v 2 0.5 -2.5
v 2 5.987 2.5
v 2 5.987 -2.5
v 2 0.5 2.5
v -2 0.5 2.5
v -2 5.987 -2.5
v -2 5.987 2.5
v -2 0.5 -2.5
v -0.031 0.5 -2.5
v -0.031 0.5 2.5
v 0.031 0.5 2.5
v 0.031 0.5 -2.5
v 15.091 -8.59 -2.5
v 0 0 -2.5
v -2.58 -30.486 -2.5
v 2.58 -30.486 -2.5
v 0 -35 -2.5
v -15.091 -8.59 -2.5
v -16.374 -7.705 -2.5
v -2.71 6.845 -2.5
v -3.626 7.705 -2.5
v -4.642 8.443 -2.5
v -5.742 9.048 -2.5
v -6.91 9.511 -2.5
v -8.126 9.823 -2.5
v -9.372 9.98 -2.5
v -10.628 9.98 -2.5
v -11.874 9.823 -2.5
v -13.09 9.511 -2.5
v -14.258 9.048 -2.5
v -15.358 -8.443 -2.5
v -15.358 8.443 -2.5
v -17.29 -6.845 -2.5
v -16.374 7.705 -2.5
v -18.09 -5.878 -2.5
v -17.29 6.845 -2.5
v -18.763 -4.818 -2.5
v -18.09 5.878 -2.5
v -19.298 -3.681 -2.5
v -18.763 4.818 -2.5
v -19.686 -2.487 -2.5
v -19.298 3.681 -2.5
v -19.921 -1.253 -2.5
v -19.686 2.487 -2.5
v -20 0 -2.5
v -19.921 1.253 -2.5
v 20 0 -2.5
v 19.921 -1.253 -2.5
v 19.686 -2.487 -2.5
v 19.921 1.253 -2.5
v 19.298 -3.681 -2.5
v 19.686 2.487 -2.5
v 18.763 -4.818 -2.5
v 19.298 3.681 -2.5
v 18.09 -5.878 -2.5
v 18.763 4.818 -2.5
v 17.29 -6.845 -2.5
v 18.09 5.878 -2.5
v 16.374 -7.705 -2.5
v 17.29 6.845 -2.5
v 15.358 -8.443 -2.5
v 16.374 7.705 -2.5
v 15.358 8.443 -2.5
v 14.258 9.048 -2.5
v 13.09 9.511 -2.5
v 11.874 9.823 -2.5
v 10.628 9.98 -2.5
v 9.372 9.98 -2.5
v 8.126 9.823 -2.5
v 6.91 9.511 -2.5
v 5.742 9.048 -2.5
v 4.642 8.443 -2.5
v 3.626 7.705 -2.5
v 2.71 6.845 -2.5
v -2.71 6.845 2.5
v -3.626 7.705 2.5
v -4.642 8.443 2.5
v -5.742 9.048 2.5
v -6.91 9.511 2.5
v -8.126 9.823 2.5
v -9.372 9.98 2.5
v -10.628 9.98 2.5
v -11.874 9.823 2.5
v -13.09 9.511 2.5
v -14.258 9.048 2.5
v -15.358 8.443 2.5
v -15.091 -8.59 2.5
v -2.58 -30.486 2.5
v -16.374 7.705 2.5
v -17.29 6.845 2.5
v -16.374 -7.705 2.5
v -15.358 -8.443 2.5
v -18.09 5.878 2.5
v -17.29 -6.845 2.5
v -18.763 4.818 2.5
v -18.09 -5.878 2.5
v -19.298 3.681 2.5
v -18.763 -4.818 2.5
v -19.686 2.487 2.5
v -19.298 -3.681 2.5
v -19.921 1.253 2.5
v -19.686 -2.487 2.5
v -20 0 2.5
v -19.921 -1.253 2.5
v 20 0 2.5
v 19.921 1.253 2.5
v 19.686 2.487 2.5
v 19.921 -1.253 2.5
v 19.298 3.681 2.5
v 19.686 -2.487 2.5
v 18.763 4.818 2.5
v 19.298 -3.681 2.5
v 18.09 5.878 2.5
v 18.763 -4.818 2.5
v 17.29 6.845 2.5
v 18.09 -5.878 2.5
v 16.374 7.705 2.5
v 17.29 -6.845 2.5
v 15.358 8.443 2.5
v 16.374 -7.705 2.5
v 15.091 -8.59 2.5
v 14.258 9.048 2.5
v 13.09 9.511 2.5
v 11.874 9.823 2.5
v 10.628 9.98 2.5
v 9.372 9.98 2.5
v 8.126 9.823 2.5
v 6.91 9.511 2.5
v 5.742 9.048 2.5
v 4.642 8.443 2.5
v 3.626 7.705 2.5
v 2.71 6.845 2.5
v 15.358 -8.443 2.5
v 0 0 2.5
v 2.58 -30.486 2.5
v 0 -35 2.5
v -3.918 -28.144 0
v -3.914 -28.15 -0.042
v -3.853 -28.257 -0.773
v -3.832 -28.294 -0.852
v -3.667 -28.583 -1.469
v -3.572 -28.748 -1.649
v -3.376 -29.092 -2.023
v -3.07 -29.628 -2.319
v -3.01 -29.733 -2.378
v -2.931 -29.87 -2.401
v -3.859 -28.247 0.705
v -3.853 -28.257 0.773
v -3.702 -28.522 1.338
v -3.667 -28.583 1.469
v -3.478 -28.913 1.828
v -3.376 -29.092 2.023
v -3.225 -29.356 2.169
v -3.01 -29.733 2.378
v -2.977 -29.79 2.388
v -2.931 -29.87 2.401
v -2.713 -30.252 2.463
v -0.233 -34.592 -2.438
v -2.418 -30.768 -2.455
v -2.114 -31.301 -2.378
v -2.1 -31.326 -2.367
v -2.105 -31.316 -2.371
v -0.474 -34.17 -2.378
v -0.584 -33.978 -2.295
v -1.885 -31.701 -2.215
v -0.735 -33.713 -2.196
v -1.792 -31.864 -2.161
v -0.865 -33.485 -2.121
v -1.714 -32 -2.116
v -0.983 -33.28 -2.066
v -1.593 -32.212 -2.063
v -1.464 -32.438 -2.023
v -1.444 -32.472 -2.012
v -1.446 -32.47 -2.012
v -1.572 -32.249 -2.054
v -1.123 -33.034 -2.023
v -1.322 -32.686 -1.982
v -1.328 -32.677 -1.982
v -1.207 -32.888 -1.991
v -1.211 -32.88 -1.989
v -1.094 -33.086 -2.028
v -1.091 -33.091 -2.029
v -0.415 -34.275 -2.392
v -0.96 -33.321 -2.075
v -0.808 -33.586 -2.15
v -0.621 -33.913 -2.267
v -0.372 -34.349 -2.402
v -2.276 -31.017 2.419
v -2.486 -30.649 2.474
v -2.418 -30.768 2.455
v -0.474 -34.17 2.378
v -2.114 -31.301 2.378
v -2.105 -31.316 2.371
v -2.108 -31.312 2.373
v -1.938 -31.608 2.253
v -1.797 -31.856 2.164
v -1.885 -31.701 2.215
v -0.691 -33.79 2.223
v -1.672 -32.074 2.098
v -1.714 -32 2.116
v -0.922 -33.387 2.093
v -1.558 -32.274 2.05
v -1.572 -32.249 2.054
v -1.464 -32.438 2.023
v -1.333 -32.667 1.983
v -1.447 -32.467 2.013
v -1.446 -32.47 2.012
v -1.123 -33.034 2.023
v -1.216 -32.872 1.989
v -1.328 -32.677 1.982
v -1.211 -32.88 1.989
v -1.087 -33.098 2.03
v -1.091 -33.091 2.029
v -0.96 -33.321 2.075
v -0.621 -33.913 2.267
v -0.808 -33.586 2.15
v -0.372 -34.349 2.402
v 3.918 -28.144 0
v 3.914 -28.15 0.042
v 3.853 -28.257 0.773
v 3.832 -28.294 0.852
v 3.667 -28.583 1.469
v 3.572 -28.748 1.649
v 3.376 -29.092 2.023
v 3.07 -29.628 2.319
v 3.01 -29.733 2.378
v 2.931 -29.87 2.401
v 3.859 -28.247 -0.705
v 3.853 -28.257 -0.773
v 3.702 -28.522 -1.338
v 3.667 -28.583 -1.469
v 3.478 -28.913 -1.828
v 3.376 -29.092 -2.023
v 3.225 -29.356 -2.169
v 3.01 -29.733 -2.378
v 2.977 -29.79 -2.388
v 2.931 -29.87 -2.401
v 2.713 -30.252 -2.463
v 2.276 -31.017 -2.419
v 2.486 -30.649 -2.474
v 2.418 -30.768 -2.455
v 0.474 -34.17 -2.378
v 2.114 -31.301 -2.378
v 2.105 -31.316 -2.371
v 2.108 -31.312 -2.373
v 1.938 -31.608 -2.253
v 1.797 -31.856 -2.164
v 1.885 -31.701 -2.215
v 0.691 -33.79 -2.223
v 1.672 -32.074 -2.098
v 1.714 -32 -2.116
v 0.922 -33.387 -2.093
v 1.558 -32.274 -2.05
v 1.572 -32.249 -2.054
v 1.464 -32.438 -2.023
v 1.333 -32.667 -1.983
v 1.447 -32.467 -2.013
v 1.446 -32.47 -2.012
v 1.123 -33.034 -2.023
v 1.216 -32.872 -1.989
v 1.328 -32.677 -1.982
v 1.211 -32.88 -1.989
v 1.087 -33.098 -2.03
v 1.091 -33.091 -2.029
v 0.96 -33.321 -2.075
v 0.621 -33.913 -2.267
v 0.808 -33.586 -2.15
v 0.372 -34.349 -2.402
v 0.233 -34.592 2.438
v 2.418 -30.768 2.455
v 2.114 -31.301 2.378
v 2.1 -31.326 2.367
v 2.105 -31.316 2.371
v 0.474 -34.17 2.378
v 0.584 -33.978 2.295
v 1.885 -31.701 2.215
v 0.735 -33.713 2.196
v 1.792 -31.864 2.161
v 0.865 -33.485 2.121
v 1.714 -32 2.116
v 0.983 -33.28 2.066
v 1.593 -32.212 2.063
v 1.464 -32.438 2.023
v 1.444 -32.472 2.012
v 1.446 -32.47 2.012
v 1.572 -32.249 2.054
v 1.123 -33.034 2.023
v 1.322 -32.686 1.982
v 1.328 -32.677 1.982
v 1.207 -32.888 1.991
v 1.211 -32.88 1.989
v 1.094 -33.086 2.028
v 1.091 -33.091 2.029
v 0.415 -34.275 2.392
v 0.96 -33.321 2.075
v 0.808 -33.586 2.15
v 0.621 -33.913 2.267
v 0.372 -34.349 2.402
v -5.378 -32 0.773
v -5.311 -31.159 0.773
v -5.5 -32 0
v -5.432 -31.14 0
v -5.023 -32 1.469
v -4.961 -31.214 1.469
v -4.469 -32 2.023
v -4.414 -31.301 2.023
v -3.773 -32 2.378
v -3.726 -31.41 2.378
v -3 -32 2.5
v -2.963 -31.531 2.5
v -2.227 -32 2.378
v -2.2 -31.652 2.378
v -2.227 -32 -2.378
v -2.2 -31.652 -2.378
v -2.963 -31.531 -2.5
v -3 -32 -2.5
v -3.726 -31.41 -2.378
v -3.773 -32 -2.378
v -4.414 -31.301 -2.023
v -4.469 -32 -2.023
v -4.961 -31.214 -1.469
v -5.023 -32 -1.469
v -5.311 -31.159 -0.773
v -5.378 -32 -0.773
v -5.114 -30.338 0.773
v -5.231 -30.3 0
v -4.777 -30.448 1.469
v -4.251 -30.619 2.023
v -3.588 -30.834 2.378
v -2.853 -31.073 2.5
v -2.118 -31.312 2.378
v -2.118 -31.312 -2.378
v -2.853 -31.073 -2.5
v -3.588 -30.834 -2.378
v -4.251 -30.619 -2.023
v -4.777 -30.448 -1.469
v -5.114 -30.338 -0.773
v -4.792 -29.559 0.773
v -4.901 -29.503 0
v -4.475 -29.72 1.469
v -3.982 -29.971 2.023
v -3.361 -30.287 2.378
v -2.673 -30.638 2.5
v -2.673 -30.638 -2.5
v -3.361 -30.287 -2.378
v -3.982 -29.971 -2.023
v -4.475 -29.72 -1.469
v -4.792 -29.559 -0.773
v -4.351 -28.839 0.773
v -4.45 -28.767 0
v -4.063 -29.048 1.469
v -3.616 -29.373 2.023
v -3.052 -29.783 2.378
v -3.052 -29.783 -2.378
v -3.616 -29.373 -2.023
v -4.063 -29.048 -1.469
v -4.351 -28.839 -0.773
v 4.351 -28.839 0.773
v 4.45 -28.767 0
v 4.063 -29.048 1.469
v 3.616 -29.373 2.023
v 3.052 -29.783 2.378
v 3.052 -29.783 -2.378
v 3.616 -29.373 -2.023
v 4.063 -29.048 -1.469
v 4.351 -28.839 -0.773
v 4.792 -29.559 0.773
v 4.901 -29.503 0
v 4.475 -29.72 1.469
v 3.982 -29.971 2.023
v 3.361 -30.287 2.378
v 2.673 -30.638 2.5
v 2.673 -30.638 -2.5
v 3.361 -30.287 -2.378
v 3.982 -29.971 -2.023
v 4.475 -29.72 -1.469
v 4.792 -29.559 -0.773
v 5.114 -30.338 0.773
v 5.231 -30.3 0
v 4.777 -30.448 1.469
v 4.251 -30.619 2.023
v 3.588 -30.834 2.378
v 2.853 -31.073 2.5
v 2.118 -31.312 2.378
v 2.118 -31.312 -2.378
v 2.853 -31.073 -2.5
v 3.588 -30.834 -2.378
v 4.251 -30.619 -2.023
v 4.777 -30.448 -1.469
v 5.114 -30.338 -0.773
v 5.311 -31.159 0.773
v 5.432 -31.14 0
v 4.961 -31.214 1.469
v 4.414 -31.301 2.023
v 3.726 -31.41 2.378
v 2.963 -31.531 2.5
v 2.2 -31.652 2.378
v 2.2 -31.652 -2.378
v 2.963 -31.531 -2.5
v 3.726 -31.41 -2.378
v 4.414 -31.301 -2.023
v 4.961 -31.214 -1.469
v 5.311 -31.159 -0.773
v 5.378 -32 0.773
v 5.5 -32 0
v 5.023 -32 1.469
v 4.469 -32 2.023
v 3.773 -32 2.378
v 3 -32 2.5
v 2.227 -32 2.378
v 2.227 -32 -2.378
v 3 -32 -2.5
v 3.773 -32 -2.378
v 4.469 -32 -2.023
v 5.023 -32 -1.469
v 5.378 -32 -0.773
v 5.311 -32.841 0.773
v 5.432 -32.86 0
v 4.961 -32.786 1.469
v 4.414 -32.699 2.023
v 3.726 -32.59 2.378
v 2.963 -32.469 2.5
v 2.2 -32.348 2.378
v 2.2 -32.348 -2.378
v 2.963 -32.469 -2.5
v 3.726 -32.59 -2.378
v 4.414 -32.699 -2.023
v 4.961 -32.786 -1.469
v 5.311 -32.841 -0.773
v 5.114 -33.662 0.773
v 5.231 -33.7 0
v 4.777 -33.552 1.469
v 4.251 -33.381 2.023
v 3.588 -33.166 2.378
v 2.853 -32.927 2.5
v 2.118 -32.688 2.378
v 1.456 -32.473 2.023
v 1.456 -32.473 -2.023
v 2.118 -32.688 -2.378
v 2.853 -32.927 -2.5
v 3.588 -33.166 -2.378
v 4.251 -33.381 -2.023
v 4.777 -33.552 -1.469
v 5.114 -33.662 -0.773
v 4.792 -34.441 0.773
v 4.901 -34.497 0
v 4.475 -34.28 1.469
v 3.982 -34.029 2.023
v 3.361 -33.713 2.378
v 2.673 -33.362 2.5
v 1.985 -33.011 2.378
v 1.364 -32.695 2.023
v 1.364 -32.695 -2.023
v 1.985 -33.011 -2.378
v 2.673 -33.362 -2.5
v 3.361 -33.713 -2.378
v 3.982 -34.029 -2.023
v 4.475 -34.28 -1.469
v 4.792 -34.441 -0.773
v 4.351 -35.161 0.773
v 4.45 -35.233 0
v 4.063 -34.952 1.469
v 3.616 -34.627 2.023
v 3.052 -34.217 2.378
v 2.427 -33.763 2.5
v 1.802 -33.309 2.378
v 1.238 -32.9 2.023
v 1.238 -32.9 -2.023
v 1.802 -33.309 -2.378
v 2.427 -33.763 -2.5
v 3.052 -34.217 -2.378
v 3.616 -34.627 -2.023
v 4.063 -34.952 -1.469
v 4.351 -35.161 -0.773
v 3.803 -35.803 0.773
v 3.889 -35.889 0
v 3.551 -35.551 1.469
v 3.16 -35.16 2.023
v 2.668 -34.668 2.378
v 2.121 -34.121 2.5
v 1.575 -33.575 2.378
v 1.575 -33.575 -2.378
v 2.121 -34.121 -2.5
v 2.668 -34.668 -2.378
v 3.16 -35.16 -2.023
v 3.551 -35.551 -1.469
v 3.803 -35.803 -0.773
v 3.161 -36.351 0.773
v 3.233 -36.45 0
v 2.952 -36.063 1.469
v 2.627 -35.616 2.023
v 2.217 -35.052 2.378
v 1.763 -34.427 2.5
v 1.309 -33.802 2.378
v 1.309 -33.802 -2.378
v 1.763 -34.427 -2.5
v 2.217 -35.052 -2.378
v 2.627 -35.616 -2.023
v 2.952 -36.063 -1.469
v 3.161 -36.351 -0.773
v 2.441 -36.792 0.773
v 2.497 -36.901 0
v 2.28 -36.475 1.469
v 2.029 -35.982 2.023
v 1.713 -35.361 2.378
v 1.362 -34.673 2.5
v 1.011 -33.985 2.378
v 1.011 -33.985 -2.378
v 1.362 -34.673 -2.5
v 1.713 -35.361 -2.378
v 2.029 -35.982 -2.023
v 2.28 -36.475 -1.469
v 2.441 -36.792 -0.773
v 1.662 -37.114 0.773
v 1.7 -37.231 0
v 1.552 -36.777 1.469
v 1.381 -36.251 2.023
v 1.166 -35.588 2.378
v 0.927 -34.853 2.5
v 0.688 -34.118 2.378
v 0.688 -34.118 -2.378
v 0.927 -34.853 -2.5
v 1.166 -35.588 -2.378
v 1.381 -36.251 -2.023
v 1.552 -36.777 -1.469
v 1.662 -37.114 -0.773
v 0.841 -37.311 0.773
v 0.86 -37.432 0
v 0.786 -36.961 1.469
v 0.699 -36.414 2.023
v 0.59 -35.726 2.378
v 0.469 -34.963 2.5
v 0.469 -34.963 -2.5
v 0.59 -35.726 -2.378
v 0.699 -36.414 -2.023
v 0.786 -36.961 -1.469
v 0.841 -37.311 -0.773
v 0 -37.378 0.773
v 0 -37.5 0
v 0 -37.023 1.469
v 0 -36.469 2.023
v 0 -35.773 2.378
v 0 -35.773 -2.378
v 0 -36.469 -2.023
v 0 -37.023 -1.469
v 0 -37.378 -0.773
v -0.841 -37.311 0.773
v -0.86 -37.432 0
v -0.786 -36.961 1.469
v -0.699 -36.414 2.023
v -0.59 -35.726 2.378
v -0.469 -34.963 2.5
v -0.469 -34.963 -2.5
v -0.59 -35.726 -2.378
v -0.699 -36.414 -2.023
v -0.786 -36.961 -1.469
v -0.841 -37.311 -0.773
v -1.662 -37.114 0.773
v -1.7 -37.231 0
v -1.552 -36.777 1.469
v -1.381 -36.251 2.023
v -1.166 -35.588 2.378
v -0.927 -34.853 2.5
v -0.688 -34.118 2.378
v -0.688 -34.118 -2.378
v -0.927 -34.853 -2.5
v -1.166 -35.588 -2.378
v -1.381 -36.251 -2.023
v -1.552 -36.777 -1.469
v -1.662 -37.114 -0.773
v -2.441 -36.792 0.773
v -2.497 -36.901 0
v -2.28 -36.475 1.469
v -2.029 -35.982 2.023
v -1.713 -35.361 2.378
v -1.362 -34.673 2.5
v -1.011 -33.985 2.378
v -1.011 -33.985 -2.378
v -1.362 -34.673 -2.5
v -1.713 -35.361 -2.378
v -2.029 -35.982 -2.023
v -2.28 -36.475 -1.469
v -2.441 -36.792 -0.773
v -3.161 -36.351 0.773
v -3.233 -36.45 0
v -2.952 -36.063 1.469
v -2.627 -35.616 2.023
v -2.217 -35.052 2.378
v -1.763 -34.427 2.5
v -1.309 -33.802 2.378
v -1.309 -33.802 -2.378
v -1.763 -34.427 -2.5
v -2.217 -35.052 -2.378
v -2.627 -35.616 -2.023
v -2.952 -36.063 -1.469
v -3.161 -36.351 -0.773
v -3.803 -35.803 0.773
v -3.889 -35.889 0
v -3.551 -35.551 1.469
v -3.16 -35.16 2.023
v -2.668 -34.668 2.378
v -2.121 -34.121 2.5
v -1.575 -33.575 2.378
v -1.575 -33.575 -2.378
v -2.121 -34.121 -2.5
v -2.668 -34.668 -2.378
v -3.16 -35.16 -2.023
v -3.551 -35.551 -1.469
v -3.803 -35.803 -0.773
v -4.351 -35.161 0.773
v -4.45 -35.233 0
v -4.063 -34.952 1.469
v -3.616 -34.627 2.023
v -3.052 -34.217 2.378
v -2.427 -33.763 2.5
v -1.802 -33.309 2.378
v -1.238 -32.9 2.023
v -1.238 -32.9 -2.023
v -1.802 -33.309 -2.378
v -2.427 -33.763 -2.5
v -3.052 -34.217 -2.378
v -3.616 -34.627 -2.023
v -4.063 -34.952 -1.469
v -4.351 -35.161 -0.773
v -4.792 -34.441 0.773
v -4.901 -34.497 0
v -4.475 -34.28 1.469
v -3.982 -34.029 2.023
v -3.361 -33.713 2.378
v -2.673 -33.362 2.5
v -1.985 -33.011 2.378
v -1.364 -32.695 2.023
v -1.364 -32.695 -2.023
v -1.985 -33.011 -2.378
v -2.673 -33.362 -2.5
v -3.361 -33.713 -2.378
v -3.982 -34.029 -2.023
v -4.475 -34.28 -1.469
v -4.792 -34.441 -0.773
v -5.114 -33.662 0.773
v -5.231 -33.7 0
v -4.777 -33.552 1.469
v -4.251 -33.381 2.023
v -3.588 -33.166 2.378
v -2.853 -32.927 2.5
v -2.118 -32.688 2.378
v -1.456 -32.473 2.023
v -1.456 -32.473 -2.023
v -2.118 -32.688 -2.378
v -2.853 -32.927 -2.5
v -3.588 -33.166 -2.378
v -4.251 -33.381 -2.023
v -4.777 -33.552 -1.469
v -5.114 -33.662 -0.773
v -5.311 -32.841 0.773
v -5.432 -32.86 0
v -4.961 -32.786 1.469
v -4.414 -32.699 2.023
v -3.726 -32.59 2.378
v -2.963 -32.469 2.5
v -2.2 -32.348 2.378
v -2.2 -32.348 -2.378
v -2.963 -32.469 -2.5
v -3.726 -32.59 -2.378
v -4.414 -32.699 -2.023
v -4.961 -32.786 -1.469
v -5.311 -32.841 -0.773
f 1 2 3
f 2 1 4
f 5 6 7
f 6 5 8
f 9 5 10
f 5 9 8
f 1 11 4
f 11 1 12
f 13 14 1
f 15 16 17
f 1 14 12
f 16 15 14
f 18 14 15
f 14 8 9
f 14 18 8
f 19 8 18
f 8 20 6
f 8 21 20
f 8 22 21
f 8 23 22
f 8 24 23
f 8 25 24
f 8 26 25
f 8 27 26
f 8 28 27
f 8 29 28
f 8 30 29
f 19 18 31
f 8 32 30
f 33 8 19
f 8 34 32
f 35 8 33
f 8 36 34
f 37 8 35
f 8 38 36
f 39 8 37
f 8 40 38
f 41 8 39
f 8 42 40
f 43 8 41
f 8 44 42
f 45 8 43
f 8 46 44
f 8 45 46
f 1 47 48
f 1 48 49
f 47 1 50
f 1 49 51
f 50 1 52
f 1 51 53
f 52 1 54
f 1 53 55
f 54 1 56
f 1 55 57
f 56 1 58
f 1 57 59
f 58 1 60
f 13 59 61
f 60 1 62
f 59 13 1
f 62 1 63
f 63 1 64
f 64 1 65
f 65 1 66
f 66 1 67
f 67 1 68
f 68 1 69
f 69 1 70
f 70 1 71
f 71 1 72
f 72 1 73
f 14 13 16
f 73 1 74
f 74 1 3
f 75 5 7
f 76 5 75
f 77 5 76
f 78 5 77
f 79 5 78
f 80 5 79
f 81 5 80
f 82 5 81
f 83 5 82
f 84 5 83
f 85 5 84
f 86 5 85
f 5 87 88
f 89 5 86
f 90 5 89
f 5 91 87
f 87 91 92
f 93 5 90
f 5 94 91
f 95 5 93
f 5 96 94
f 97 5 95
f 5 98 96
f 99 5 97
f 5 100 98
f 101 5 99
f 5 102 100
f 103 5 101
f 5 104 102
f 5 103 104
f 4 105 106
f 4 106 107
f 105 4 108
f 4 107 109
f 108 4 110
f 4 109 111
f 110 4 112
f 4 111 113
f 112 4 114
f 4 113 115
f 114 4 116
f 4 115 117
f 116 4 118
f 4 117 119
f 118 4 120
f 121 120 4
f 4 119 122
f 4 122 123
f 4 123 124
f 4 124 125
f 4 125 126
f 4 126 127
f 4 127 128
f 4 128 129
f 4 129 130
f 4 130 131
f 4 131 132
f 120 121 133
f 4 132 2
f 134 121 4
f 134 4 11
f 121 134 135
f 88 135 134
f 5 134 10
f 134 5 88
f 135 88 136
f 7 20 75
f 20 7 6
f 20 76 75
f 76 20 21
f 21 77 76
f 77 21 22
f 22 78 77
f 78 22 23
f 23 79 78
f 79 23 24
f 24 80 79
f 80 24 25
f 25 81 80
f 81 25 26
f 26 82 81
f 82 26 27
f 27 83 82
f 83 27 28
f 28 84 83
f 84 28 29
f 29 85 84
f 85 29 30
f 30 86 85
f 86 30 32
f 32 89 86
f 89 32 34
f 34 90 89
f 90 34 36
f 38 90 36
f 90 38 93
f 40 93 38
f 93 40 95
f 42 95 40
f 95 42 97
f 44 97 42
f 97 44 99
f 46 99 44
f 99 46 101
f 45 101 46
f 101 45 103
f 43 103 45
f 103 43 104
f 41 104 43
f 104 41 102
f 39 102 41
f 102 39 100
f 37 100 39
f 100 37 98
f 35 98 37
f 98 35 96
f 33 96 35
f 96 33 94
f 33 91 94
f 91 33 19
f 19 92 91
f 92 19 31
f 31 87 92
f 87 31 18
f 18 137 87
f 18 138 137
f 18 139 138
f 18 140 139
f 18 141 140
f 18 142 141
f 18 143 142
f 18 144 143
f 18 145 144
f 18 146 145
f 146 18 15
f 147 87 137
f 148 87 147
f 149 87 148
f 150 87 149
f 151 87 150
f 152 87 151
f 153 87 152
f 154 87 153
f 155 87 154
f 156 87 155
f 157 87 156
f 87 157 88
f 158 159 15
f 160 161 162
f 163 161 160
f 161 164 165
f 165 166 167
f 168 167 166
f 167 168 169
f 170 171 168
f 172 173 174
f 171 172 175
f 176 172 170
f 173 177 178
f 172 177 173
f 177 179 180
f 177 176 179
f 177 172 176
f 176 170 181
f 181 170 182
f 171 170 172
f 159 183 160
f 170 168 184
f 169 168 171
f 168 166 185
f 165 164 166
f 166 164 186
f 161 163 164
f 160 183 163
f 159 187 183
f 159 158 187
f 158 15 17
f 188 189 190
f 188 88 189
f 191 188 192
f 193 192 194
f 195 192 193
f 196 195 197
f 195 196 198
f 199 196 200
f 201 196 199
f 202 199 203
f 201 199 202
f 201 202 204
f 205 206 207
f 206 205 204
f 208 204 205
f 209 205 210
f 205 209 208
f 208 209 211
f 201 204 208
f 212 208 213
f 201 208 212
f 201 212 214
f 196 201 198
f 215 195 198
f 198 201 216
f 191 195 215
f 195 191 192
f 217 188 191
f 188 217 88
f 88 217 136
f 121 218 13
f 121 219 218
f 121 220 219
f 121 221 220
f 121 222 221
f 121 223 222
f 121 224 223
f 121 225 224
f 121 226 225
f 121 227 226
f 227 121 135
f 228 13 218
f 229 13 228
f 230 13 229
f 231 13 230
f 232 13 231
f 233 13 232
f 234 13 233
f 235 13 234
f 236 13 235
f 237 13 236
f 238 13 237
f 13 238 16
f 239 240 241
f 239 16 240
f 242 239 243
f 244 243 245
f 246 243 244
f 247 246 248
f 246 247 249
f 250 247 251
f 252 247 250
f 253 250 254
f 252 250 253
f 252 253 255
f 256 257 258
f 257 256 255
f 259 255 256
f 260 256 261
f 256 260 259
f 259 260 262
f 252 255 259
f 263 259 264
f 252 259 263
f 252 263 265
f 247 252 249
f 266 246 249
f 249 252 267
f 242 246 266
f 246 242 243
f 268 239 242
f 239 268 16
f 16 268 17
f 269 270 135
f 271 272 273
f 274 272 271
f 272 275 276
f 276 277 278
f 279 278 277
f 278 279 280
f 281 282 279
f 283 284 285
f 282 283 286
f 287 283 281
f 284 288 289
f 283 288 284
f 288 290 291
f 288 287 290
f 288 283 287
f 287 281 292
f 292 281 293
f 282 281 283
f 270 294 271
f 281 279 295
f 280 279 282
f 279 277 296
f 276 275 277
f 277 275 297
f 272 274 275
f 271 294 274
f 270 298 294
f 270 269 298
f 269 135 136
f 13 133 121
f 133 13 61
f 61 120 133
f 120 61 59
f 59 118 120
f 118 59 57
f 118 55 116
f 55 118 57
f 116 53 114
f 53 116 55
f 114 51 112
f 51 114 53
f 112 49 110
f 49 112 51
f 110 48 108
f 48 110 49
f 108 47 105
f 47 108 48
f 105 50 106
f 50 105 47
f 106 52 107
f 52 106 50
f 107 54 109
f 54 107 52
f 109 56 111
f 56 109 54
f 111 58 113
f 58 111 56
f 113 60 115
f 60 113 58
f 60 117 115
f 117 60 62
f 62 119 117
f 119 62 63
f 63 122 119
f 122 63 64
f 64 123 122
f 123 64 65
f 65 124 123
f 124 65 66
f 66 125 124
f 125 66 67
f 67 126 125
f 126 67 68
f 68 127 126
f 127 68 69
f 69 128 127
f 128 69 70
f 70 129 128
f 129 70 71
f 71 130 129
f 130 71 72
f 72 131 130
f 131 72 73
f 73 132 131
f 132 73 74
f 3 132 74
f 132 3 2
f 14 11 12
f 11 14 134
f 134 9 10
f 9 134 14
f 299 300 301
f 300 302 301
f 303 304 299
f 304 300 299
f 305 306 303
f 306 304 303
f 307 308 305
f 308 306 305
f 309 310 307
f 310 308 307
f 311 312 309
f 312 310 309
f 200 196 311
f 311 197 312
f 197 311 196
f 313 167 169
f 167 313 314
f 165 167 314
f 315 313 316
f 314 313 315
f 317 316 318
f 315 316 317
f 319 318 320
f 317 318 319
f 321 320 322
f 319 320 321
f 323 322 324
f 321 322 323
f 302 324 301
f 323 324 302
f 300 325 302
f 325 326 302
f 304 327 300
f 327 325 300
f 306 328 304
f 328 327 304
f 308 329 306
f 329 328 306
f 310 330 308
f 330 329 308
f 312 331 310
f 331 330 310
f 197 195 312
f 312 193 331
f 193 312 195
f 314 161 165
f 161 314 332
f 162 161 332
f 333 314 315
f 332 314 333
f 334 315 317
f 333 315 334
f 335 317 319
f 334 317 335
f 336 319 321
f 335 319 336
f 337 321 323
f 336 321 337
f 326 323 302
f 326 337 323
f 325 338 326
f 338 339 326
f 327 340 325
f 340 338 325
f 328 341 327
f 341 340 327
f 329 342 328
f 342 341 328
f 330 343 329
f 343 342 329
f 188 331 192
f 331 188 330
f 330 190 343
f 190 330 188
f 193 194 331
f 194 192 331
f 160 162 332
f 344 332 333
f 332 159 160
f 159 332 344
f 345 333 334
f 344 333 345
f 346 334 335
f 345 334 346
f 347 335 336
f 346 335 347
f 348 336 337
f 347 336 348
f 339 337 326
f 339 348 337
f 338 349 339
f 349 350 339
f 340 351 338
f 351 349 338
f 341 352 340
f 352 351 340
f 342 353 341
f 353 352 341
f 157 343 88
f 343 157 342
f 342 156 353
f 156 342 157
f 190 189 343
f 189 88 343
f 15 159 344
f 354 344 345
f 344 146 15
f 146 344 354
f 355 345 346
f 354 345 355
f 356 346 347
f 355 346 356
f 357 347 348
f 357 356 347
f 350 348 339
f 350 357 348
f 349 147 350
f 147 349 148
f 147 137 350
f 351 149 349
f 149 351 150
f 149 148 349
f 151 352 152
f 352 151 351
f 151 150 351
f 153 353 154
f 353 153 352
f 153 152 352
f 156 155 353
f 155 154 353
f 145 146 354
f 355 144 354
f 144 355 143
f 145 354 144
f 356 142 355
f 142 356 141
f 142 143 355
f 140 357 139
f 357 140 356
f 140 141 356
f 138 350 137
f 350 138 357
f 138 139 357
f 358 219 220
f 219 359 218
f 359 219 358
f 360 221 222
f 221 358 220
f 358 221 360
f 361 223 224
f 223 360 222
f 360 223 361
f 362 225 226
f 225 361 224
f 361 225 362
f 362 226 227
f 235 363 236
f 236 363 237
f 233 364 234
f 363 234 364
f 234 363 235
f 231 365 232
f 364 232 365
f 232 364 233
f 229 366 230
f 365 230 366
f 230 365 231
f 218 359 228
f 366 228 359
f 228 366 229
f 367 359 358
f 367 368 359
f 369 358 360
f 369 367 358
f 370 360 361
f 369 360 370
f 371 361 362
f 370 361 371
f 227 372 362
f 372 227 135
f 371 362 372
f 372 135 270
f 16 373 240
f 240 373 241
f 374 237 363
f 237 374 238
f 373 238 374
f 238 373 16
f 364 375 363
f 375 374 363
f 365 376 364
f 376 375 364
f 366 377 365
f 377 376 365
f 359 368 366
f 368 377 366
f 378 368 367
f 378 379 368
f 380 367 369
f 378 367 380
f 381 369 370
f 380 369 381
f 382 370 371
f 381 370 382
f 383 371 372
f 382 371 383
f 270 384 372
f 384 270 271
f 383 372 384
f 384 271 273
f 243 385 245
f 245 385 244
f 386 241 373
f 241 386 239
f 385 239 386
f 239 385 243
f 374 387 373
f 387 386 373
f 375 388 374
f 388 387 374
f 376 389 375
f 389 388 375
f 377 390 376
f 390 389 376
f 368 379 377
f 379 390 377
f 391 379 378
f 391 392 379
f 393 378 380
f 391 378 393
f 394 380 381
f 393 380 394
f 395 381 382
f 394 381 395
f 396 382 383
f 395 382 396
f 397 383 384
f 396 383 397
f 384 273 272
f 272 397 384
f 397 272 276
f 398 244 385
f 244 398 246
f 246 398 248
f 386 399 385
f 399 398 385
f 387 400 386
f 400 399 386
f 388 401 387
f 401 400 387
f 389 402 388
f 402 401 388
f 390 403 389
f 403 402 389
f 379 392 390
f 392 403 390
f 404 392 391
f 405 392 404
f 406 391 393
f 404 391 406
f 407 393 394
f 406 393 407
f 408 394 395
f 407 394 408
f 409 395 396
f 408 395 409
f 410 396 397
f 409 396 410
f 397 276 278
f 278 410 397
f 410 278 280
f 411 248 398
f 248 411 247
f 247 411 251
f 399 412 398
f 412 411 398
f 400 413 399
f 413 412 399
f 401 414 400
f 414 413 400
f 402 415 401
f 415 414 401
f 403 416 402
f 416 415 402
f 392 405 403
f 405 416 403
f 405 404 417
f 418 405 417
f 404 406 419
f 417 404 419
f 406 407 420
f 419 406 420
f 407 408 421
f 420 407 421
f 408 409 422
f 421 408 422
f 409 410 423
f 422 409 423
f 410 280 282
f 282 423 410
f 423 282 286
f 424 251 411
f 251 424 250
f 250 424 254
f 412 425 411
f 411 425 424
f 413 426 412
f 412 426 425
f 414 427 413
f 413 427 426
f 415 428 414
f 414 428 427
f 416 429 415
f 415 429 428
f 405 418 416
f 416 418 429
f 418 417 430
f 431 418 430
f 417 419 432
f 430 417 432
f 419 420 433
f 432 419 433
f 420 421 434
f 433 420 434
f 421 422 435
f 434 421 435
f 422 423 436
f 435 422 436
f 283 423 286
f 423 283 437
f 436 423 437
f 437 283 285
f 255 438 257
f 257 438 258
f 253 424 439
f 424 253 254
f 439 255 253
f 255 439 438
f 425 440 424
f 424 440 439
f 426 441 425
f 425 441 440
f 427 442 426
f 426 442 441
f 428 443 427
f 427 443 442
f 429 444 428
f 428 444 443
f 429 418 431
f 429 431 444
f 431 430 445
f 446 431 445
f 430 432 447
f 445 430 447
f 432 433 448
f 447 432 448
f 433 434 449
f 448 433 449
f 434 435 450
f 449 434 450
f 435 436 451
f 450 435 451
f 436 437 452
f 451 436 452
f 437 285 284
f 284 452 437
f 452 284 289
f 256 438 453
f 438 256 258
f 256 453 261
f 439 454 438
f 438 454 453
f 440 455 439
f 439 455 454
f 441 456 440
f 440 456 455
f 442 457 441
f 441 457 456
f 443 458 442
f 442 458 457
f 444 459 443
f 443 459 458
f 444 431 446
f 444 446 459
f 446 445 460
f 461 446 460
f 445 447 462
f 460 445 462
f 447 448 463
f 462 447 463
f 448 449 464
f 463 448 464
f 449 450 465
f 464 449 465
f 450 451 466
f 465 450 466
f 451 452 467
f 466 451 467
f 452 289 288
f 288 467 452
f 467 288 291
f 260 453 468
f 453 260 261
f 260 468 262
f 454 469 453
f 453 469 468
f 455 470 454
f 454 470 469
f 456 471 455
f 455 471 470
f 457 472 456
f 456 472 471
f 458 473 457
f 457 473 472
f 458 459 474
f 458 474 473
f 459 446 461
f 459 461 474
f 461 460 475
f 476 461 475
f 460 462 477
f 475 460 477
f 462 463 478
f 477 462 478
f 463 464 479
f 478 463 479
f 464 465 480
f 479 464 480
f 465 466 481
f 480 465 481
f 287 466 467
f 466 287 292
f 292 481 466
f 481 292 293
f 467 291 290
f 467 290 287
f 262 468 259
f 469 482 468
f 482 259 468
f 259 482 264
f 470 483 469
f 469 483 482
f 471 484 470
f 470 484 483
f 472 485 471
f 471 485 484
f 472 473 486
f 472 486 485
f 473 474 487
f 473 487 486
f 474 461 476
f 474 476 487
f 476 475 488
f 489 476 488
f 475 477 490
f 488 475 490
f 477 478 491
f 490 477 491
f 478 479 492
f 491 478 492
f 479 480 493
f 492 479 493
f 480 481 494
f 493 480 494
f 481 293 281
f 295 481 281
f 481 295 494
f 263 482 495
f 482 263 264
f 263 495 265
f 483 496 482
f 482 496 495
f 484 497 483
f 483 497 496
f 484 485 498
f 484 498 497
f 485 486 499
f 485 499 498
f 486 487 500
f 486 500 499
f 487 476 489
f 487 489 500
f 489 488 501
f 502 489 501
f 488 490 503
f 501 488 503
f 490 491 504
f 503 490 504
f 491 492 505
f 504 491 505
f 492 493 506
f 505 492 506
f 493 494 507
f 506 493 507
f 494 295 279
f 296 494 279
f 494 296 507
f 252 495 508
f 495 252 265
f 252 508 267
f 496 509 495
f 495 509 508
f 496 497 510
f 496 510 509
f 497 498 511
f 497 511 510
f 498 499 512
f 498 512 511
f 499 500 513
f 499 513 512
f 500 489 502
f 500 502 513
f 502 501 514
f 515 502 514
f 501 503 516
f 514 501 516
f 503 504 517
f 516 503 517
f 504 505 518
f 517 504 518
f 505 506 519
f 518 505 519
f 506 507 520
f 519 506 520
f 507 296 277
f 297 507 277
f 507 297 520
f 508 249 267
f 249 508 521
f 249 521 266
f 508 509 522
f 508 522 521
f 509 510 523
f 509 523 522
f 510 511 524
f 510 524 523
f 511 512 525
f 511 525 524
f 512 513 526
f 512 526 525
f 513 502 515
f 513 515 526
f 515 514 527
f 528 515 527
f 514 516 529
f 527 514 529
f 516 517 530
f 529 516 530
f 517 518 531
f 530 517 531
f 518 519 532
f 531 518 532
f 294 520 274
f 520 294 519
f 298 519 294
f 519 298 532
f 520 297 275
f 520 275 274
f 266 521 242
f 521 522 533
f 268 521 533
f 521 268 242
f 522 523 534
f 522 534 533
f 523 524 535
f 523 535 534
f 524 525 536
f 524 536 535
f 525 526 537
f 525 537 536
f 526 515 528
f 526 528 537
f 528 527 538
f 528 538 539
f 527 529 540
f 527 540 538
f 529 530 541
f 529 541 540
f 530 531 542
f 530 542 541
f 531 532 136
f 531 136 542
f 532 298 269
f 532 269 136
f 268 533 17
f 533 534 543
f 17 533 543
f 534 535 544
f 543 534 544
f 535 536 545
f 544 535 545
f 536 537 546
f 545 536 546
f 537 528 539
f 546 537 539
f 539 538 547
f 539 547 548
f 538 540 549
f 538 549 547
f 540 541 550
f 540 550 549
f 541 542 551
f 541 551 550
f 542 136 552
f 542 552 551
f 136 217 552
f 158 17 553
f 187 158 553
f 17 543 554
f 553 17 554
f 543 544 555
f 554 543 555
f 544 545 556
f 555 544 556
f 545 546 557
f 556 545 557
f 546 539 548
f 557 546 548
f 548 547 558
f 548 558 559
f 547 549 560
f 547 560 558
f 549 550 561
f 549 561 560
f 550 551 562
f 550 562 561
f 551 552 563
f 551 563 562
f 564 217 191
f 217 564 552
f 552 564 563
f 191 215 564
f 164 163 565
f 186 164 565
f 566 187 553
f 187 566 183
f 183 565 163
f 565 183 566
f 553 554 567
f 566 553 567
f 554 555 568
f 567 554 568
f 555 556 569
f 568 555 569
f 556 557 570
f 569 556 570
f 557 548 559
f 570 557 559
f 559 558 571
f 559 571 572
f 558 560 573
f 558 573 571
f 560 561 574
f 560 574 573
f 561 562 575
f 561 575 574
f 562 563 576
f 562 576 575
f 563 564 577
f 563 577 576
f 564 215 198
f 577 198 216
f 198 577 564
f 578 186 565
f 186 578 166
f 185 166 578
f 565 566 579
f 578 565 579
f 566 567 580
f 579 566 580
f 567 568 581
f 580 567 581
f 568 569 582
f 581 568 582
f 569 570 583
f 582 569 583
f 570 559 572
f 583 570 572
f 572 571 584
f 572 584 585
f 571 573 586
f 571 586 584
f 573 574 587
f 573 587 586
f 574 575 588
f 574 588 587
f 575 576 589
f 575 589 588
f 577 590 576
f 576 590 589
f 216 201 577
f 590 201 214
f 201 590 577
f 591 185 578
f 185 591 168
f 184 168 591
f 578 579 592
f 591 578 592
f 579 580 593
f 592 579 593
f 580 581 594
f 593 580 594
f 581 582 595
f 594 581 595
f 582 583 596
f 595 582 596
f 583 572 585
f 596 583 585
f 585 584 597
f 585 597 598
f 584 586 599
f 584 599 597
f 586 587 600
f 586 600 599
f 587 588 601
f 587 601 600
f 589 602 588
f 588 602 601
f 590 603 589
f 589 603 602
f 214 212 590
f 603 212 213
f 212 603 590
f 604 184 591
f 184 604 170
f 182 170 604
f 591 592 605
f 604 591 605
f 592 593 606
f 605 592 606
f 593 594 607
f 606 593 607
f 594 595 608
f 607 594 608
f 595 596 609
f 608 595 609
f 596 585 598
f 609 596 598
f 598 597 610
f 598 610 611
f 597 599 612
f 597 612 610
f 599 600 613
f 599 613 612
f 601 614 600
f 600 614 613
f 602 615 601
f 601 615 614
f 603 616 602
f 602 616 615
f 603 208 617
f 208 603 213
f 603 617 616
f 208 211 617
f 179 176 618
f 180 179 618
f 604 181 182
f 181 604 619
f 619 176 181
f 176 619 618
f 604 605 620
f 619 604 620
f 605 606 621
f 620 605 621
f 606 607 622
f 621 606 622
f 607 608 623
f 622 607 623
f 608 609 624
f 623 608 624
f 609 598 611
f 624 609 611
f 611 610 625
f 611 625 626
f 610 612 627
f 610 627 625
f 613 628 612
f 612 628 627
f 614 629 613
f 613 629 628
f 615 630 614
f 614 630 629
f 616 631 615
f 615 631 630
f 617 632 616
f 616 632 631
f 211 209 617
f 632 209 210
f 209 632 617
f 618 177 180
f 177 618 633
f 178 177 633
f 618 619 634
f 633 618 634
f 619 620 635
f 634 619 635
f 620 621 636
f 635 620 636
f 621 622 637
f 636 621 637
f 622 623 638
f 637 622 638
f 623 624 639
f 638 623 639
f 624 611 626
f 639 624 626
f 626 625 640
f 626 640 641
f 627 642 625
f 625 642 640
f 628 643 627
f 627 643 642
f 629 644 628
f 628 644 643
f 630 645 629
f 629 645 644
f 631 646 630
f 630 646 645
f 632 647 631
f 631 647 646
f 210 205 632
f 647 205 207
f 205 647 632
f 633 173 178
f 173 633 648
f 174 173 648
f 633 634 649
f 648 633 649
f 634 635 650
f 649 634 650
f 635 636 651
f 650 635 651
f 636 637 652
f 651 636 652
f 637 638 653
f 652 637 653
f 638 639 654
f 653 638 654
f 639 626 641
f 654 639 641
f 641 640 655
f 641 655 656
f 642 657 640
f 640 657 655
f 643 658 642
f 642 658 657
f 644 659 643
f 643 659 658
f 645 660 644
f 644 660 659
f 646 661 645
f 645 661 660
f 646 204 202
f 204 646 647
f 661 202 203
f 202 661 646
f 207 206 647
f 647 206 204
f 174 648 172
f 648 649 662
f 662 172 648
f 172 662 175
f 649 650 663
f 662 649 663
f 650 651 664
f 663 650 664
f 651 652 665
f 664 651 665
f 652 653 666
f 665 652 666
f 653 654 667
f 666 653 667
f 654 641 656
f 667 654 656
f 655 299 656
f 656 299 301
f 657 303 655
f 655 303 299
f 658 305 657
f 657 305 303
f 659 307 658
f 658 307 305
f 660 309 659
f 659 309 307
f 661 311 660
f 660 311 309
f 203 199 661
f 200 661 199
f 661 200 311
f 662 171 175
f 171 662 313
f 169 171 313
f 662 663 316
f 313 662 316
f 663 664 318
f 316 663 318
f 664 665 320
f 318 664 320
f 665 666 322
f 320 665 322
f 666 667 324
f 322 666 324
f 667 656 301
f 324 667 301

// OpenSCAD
// Heart Keychain Model
// Created on April 2, 2025

// Parameters for customization
heart_width = 40;
heart_height = 35;
heart_thickness = 5;
// Keychain loop parameters
loop_diameter = 6; // Slightly larger for better strength
loop_thickness = heart_thickness;
loop_position = [0, -heart_height + 3, 0]; // Modified to connect at the bottom point of the heart
// Key hole parameters
key_hole_width = 8;
key_hole_height = 12;
key_hole_position = [0, heart_height/2 - 10, 0]; // Moved lower to avoid conflict with loop

// Module to create a 2D heart shape
module heart_2d(width, height) {
    union() {
        // Left half of the heart
        translate([-width/4, 0, 0])
        circle(d = width/2, $fn=50);
        
        // Right half of the heart
        translate([width/4, 0, 0])
        circle(d = width/2, $fn=50);
        
        // Bottom triangle part of the heart
        polygon(points=[
            [-width/2, 0],
            [width/2, 0],
            [0, -height]
        ]);
    }
}

// Keychain loop module - improved to ensure no artifacts
module keychain_loop(diameter, thickness) {
    difference() {
        // Outer circle of the loop
        rotate_extrude(angle = 360, $fn=40)
        translate([diameter/2, 0, 0])
        circle(d = thickness, $fn=20);
        
        // No internal subtractions needed - keeping it clean and simple
    }
}

// Key hole module
module key_hole(width, height, thickness) {
    // Classic keyhole shape
    union() {
        // Circular top part
        translate([0, height/3, 0])
        cylinder(h = thickness + 1, d = width, center = true, $fn=30);
        
        // Rectangular bottom part
        translate([0, -height/4, 0])
        cube([width/2, height/1.5, thickness + 1], center = true);
    }
}

// Main heart with keychain loop
module heart_keychain() {
    union() {
        difference() {
            // Heart base (extrude the 2D heart)
            linear_extrude(height = heart_thickness, center = true)
            heart_2d(heart_width, heart_height);
            
            // Subtract key hole
            translate(key_hole_position)
            key_hole(key_hole_width, key_hole_height, heart_thickness);
        }
        
        // Add the keychain loop with proper connection to heart
        translate(loop_position) {
            // Connection bridge to ensure the loop connects to the heart
            translate([0, loop_diameter/2, 0])
            cube([loop_diameter/2, loop_diameter/2, heart_thickness], center = true);
            
            // The loop itself
            keychain_loop(loop_diameter, loop_thickness);
        }
    }
}

// Render the model
heart_keychain();

// Uncomment to check just the 2D heart profile
// heart_2d(heart_width, heart_height);
